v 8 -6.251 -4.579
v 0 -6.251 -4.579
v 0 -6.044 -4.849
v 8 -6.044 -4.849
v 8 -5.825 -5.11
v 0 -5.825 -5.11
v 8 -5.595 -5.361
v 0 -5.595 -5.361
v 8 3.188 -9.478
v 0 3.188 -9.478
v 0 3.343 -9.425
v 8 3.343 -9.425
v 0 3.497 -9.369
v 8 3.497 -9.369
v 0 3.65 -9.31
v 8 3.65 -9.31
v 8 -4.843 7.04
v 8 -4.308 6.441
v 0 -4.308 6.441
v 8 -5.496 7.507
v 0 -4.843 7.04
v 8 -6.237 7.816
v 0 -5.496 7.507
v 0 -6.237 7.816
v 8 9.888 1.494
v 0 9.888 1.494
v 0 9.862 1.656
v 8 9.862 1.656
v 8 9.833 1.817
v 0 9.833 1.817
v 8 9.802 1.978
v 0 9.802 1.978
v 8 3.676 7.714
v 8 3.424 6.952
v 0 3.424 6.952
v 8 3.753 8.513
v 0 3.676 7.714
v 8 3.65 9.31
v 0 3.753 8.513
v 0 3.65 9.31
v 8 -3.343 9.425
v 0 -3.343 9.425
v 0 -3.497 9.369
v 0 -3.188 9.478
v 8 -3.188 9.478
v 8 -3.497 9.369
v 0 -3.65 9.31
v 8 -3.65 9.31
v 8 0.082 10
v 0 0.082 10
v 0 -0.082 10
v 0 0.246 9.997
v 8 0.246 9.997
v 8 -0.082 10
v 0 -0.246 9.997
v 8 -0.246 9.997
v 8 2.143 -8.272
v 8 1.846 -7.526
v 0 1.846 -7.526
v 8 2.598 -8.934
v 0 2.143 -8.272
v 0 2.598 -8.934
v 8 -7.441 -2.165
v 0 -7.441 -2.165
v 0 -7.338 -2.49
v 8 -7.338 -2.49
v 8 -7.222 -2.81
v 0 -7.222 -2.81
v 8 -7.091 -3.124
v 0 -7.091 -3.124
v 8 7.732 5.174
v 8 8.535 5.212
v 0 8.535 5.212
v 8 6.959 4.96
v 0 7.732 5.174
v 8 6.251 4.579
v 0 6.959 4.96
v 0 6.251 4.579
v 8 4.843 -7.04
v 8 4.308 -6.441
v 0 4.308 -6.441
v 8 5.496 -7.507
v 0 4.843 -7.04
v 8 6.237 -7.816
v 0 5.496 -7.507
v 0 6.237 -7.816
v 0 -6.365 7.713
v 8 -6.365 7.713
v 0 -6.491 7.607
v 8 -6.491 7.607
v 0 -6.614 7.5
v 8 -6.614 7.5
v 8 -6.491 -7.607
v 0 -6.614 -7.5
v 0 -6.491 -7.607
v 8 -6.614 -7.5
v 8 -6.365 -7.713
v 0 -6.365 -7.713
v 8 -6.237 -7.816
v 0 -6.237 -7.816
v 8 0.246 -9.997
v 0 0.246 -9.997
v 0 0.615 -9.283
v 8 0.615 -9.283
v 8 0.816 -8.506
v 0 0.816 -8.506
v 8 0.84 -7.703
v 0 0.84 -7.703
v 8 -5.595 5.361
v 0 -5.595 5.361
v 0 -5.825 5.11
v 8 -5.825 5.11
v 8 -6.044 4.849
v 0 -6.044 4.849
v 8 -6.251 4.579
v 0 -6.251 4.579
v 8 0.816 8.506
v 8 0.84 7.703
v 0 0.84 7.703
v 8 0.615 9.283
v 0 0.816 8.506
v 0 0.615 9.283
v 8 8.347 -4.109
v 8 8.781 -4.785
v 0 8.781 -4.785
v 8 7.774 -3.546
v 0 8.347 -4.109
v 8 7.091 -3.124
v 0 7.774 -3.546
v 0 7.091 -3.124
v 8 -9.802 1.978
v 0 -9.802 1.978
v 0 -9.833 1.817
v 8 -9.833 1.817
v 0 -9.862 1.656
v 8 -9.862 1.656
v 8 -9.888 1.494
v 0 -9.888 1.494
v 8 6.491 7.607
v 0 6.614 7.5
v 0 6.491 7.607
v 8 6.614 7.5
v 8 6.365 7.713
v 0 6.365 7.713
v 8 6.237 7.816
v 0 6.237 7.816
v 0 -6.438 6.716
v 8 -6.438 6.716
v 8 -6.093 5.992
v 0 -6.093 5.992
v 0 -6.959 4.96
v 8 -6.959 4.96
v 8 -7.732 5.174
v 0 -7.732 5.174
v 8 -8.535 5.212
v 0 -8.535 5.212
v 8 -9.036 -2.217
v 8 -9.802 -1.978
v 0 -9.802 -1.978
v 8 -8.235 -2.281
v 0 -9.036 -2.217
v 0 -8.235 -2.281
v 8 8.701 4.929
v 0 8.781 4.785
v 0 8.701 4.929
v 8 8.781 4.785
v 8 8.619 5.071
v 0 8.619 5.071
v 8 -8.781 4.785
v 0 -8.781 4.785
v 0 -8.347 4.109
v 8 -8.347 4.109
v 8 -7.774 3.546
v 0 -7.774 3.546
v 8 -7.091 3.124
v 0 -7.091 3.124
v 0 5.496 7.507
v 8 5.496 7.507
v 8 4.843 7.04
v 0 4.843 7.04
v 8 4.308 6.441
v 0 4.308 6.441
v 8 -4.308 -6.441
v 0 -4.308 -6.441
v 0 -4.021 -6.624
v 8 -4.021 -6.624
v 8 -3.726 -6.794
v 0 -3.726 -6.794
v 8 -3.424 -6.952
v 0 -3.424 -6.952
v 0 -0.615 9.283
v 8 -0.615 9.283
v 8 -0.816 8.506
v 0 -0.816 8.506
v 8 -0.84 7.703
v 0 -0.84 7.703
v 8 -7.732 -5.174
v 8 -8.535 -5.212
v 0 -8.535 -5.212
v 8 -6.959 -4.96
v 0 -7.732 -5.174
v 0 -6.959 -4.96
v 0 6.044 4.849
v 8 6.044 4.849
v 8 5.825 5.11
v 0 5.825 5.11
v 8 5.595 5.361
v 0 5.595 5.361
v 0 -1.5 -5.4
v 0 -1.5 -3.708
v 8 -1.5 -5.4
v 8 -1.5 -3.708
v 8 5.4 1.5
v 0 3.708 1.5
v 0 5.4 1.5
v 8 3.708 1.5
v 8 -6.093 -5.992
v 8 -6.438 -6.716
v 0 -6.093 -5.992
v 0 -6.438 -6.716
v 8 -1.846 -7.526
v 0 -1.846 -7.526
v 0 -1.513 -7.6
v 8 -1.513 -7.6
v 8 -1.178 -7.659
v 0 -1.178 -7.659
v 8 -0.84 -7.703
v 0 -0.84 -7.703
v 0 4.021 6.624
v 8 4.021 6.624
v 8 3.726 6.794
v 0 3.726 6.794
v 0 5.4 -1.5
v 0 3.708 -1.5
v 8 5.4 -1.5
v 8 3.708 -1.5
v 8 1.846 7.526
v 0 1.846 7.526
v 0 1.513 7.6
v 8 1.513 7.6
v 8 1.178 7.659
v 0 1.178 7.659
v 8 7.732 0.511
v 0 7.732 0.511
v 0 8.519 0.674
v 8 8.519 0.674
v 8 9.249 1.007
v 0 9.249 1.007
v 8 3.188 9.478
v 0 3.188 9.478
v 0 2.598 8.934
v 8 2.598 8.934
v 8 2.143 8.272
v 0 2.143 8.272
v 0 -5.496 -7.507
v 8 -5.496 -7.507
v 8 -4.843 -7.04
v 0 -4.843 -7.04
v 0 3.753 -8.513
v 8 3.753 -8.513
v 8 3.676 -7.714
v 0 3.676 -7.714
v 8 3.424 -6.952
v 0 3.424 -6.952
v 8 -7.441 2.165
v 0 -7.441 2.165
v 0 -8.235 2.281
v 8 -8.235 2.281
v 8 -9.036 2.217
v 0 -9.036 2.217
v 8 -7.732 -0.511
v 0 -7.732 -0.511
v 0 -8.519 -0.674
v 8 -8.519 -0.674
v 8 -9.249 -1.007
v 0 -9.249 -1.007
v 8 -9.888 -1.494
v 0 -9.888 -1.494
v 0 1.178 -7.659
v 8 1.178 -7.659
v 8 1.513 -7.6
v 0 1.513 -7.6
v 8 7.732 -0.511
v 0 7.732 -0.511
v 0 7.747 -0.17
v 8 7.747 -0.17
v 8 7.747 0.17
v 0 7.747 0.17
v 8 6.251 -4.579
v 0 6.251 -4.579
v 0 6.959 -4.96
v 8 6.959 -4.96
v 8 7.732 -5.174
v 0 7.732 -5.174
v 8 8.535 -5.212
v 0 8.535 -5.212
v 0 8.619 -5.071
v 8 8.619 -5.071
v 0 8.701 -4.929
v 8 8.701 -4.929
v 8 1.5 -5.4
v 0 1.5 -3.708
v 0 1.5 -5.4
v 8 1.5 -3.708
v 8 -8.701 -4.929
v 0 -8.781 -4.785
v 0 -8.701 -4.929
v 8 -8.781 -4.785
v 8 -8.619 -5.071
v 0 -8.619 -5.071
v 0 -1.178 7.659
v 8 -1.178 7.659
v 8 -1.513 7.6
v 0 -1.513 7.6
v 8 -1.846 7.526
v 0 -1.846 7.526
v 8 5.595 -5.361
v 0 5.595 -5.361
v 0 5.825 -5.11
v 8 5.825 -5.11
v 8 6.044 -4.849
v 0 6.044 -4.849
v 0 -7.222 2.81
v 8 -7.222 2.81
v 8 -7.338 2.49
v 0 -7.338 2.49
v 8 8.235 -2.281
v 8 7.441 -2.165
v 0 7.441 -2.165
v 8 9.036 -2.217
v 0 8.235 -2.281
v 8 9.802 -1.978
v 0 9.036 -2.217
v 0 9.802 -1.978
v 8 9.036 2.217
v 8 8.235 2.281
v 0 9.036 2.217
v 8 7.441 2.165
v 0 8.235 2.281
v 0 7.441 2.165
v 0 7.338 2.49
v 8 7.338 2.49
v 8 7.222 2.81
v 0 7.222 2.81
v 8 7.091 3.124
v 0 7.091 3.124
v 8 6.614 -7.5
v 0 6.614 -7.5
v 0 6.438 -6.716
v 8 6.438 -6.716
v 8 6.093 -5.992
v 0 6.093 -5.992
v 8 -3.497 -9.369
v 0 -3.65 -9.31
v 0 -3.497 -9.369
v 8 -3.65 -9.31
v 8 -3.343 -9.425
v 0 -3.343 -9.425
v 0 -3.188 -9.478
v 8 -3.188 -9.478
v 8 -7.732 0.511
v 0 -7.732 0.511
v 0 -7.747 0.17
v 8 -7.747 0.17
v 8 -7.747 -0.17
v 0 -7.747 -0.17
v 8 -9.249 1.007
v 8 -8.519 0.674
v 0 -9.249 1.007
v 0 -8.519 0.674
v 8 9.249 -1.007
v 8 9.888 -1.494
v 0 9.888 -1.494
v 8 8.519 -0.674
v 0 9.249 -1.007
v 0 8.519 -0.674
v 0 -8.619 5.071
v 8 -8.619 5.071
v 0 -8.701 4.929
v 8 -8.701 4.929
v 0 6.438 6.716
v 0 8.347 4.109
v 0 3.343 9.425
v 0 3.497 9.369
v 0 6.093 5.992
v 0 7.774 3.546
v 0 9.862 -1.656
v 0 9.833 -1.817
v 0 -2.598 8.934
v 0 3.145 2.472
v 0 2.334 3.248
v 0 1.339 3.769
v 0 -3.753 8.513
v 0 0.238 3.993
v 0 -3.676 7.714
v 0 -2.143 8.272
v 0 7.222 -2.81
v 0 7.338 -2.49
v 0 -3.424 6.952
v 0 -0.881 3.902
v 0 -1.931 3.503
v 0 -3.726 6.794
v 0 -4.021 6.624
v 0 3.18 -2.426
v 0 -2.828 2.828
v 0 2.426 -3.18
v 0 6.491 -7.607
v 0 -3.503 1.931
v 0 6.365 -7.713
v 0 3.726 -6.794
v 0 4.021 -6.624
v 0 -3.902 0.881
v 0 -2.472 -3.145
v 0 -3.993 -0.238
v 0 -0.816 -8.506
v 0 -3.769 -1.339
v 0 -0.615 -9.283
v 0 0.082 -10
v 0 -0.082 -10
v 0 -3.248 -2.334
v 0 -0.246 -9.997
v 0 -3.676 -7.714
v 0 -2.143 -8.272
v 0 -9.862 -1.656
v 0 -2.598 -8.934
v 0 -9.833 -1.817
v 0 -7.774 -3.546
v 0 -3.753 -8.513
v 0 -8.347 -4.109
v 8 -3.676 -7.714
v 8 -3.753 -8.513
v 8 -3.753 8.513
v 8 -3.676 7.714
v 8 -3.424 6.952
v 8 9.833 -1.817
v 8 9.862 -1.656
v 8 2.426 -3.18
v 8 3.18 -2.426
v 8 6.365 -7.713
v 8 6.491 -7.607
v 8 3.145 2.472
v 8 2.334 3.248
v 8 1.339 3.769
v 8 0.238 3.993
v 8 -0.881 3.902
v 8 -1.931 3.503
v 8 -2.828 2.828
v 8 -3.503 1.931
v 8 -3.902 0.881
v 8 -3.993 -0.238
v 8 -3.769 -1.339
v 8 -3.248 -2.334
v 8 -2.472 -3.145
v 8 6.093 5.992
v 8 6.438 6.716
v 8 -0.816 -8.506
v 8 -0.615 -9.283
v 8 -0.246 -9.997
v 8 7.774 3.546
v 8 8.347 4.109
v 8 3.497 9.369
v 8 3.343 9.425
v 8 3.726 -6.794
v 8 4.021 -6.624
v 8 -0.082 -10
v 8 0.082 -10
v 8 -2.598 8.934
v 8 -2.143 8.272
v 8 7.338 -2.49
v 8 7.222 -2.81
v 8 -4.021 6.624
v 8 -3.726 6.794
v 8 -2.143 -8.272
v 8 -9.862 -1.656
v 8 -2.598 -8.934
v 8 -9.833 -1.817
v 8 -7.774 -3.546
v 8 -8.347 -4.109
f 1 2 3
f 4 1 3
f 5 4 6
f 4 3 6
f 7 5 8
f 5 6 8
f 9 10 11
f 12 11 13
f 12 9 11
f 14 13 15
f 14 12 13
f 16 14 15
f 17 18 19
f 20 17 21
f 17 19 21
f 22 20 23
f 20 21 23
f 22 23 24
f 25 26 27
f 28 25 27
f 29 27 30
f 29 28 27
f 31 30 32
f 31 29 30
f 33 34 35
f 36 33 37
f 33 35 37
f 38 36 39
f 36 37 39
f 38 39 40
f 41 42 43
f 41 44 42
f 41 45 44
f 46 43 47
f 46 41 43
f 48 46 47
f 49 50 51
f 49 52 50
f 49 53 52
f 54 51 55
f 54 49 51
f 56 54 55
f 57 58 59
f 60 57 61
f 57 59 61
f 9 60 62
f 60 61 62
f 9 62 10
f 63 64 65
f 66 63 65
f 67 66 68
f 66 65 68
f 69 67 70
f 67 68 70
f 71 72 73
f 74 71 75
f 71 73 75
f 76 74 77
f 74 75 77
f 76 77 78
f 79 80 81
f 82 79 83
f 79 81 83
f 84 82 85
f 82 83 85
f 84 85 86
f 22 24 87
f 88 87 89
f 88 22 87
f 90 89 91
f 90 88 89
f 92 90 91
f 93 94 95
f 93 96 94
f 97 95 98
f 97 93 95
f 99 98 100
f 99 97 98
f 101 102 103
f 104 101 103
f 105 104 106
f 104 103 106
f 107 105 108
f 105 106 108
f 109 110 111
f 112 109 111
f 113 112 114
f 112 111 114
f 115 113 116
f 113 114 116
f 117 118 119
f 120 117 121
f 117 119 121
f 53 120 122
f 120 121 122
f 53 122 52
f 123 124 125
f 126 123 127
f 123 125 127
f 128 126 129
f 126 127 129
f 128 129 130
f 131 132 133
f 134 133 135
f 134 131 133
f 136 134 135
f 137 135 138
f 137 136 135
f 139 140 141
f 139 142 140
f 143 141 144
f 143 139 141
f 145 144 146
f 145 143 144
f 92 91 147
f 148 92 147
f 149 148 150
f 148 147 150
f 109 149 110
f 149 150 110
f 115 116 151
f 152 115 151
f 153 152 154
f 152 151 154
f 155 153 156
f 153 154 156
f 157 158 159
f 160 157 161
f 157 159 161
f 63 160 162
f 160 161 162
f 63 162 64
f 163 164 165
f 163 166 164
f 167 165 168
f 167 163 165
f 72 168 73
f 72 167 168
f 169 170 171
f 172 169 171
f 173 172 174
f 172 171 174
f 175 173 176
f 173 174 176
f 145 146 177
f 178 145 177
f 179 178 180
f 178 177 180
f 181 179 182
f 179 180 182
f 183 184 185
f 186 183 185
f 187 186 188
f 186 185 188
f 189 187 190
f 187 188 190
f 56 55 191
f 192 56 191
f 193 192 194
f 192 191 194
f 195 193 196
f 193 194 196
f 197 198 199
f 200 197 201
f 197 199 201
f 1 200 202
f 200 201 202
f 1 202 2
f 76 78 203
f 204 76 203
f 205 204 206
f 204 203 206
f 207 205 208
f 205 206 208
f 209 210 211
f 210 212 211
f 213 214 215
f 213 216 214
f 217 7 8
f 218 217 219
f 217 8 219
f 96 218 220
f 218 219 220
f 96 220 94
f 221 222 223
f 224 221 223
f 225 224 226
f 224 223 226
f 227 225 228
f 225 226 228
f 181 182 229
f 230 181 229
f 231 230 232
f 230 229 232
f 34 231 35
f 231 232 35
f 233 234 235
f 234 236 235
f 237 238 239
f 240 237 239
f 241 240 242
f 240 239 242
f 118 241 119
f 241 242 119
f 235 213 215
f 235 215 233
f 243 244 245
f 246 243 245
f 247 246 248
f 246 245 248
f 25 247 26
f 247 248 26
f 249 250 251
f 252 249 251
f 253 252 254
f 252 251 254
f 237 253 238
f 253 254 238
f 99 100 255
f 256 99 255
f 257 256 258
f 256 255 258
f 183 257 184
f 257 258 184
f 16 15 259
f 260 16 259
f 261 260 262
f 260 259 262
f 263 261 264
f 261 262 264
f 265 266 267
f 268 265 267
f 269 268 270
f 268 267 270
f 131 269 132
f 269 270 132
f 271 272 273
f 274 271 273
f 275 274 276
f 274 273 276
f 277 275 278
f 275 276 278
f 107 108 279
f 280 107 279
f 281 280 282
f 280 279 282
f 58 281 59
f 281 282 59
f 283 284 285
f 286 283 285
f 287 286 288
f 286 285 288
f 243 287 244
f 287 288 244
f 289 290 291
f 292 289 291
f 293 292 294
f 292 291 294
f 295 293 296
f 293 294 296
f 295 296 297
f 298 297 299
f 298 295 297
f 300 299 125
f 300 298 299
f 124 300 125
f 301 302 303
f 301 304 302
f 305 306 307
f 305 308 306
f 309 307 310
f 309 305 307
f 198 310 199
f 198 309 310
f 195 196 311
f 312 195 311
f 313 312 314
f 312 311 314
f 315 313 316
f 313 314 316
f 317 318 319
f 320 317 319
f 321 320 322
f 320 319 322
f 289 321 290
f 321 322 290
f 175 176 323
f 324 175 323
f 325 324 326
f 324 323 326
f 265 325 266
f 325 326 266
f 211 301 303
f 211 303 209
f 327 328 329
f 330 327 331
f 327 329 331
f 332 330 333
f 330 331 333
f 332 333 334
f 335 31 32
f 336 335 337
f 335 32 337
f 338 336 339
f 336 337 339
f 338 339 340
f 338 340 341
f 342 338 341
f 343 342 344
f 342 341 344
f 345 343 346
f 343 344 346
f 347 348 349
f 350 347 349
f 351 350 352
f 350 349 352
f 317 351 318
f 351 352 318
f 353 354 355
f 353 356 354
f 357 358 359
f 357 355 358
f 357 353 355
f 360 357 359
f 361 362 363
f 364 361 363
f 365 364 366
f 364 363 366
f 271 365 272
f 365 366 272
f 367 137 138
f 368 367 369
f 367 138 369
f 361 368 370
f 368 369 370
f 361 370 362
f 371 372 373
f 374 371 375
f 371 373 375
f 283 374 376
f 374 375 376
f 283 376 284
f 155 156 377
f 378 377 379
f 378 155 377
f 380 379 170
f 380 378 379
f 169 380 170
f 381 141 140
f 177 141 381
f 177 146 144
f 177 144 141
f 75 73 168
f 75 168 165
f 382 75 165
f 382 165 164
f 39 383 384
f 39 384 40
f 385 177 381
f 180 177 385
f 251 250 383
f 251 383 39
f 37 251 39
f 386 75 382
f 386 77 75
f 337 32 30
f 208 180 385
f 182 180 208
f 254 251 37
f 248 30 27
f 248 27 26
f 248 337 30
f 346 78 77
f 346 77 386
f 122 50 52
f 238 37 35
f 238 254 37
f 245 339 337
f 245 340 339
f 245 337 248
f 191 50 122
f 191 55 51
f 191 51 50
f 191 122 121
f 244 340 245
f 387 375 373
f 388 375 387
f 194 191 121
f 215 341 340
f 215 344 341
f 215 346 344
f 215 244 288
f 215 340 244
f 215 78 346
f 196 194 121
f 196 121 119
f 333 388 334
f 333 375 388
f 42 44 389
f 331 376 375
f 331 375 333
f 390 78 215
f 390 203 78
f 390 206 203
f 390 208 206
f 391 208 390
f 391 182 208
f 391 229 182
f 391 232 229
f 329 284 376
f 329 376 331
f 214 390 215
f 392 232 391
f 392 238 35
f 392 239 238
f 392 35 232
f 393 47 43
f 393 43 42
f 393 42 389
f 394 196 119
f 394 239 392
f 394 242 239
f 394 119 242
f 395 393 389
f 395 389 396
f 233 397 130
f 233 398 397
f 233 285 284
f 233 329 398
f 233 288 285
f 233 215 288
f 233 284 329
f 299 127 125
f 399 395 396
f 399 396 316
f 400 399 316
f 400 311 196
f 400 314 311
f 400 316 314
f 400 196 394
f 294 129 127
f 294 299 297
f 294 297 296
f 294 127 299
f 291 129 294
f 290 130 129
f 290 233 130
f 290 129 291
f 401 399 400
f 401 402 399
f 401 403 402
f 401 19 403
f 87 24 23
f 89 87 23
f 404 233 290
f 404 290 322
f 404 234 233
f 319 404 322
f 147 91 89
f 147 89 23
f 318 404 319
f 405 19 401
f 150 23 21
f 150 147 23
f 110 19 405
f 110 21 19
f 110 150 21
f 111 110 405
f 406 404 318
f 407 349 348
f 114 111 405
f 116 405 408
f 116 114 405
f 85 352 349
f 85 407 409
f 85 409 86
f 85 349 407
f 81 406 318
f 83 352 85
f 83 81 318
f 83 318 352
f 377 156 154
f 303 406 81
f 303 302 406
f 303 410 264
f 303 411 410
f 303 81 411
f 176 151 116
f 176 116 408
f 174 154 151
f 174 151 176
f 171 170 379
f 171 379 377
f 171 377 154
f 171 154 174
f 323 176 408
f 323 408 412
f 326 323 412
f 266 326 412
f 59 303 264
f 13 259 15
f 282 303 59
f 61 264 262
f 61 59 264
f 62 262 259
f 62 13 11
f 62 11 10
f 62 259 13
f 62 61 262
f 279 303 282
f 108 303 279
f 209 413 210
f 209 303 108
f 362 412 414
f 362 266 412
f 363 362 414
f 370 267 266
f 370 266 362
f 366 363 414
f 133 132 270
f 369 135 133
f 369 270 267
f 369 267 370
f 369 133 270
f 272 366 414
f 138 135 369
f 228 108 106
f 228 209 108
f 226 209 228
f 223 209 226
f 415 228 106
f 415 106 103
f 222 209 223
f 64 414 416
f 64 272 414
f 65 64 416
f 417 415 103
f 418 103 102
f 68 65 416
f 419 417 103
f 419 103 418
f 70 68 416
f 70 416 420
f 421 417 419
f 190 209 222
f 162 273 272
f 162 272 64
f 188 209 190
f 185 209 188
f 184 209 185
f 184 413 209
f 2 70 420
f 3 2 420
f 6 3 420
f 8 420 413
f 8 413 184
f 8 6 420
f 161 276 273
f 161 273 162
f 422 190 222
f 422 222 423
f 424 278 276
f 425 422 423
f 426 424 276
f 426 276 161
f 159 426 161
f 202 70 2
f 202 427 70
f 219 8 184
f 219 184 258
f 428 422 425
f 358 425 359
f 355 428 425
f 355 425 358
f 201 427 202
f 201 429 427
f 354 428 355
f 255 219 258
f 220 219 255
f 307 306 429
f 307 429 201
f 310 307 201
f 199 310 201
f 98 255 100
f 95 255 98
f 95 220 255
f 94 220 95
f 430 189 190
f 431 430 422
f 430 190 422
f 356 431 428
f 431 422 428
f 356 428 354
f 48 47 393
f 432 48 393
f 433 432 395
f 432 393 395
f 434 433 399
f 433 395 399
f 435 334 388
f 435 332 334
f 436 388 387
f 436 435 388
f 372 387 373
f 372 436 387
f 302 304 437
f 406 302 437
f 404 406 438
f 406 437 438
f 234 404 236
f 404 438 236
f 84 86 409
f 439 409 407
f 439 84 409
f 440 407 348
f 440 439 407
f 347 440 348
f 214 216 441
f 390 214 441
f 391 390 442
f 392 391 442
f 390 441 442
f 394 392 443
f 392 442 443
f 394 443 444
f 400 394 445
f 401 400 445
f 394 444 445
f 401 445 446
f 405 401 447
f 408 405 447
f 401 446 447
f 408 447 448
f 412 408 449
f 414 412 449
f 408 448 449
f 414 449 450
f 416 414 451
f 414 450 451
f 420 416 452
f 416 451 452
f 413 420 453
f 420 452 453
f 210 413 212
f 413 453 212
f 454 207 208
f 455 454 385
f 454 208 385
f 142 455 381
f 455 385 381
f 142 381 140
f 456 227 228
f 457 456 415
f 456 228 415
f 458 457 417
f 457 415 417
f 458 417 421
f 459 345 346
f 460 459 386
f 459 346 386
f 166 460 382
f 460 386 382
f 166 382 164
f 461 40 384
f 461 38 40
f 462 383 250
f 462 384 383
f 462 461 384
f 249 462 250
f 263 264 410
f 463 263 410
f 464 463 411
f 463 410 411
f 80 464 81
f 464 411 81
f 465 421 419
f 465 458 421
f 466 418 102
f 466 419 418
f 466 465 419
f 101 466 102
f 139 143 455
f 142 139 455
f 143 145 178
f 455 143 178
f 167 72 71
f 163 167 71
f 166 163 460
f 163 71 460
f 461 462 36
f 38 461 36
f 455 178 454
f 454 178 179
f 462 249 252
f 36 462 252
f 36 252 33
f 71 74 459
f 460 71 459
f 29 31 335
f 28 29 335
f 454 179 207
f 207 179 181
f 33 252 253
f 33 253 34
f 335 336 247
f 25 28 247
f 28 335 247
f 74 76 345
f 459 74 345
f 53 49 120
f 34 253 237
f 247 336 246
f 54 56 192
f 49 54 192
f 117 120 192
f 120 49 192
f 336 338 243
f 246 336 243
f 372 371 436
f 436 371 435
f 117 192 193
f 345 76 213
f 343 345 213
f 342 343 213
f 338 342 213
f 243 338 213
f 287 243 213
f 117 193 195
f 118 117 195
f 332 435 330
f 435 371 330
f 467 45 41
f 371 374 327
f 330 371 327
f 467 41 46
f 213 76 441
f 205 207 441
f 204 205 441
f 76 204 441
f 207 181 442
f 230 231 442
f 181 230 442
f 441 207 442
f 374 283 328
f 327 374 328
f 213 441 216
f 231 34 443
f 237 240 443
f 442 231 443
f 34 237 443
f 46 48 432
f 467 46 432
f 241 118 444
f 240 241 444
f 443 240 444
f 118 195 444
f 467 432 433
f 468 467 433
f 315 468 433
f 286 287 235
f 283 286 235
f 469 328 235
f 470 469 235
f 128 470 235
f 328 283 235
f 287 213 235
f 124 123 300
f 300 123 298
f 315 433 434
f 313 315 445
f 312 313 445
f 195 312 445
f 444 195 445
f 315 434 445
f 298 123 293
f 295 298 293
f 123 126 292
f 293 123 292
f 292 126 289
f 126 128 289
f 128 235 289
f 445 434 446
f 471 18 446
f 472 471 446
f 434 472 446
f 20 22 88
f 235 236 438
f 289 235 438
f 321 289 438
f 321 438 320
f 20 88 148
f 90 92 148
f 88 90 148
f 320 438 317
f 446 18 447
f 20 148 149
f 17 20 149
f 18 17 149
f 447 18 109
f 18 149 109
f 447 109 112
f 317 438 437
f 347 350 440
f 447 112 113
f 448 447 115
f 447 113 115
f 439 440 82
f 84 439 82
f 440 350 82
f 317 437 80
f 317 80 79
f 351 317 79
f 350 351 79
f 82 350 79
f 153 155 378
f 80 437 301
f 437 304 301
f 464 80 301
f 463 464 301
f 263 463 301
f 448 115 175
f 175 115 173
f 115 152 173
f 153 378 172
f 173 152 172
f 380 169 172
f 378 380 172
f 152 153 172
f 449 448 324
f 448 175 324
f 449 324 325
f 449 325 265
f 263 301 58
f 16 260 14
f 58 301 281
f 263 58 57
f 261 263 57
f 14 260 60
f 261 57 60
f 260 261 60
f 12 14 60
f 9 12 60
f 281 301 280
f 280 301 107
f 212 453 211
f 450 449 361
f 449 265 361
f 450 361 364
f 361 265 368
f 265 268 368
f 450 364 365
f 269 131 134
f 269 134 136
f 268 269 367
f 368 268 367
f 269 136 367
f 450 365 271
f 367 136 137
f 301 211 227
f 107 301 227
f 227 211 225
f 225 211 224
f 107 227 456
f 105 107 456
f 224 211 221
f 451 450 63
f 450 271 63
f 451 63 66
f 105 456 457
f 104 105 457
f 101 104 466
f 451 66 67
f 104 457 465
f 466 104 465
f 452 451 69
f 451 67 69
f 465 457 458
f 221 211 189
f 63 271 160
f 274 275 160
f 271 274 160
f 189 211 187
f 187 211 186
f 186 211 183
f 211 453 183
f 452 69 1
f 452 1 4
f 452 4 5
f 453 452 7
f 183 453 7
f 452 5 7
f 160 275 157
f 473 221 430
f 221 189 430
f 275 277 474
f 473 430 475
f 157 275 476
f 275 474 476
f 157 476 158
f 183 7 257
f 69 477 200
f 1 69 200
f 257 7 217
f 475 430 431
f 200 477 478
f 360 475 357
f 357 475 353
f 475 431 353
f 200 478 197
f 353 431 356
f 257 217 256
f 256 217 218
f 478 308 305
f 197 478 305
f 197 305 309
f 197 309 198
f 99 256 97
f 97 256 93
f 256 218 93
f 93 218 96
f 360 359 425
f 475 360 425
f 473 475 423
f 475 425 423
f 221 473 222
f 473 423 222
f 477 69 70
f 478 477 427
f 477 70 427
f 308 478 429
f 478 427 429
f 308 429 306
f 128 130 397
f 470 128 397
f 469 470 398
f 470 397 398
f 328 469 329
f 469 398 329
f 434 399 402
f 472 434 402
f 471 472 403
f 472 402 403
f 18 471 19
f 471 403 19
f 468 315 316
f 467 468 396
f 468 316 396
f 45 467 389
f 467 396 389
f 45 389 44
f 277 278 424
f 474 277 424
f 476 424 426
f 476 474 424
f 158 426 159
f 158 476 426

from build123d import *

# Parameters (mm, degrees)
BASPROSKE_W     = 8
BASPROSKE_H     = 10
TOOTHCUT_DEPTH  = 17.248076809
TEETHCUTS_COUNT = 18
TEETHCUTS_ANGLE = 340
BORSKE_R        = 4
BORE_DEPTH      = 50.0000508
KEYSKE_W        = 3
KEYSKE_H        = 5.4
KEYWAY_DEPTH    = 50.0000508
KEYWAY2_COUNT   = 2
KEYWAY2_ANGLE   = 90


with BuildPart() as part:
    # BasProSke → Base-Revolve (revolve)
    with BuildSketch(Plane(origin=(0, 0, 0), x_dir=(1, 0, 0), z_dir=(0, 1, 0)), mode=Mode.PRIVATE) as base_revolve_sk:
        with Locations((4, 5)):
            Rectangle(BASPROSKE_W, BASPROSKE_H)
    revolve(base_revolve_sk.sketch.rotate(Axis((-10, 0, 0), (1, 0, 0)), 180), axis=Axis((-10, 0, 0), (1, 0, 0)))

    # TooCutSke → ToothCut (cut, through all)
    with BuildSketch(Plane(origin=(0, 0, 0), x_dir=(0, 0, -1), z_dir=(1, 0, 0))):
        with BuildLine():
            ThreePointArc((0.510641536, 7.732156635), (0, 7.749), (-0.510641536, 7.732156635))
            ThreePointArc((-0.510641536, 7.732156635), (-0.82619259, 8.907320741), (-1.515208602, 9.910236529))
            ThreePointArc((-1.515208602, 9.910236529), (0, 10.0254), (1.515208602, 9.910236529))
            ThreePointArc((1.515208602, 9.910236529), (0.82619259, 8.907320741), (0.510641536, 7.732156635))
        make_face()
    toothcut = extrude(amount=TOOTHCUT_DEPTH, mode=Mode.SUBTRACT)

    # TeethCuts: ToothCut ×18 about axis
    teethcuts_axis = Axis((-10, 0, 0), (1, 0, 0))
    for i in range(1, TEETHCUTS_COUNT):
        add(toothcut.rotate(teethcuts_axis, i * TEETHCUTS_ANGLE / (TEETHCUTS_COUNT - 1)), mode=Mode.SUBTRACT)

    # BorSke → Bore (cut, symmetric)
    with BuildSketch(Plane(origin=(0, 0, 0), x_dir=(0, 0, -1), z_dir=(1, 0, 0))):
        with Locations(Location((0, 0, 0), (0, 0, 180))):
            Circle(BORSKE_R)
    extrude(amount=BORE_DEPTH, both=True, mode=Mode.SUBTRACT)

    # KeySke → Keyway (cut, symmetric)
    with BuildSketch(Plane(origin=(0, 0, 0), x_dir=(0, 0, -1), z_dir=(1, 0, 0))):
        with Locations((0, 2.7)):
            Rectangle(KEYSKE_W, KEYSKE_H)
    keyway = extrude(amount=KEYWAY_DEPTH, both=True, mode=Mode.SUBTRACT)

    # Keyway2: Keyway ×2 about axis
    keyway2_axis = Axis((0, 0, 0), (-1, 0, 0))
    for i in range(1, KEYWAY2_COUNT):
        add(keyway.rotate(keyway2_axis, i * KEYWAY2_ANGLE / (KEYWAY2_COUNT - 1)), mode=Mode.SUBTRACT)


solid = part.part
